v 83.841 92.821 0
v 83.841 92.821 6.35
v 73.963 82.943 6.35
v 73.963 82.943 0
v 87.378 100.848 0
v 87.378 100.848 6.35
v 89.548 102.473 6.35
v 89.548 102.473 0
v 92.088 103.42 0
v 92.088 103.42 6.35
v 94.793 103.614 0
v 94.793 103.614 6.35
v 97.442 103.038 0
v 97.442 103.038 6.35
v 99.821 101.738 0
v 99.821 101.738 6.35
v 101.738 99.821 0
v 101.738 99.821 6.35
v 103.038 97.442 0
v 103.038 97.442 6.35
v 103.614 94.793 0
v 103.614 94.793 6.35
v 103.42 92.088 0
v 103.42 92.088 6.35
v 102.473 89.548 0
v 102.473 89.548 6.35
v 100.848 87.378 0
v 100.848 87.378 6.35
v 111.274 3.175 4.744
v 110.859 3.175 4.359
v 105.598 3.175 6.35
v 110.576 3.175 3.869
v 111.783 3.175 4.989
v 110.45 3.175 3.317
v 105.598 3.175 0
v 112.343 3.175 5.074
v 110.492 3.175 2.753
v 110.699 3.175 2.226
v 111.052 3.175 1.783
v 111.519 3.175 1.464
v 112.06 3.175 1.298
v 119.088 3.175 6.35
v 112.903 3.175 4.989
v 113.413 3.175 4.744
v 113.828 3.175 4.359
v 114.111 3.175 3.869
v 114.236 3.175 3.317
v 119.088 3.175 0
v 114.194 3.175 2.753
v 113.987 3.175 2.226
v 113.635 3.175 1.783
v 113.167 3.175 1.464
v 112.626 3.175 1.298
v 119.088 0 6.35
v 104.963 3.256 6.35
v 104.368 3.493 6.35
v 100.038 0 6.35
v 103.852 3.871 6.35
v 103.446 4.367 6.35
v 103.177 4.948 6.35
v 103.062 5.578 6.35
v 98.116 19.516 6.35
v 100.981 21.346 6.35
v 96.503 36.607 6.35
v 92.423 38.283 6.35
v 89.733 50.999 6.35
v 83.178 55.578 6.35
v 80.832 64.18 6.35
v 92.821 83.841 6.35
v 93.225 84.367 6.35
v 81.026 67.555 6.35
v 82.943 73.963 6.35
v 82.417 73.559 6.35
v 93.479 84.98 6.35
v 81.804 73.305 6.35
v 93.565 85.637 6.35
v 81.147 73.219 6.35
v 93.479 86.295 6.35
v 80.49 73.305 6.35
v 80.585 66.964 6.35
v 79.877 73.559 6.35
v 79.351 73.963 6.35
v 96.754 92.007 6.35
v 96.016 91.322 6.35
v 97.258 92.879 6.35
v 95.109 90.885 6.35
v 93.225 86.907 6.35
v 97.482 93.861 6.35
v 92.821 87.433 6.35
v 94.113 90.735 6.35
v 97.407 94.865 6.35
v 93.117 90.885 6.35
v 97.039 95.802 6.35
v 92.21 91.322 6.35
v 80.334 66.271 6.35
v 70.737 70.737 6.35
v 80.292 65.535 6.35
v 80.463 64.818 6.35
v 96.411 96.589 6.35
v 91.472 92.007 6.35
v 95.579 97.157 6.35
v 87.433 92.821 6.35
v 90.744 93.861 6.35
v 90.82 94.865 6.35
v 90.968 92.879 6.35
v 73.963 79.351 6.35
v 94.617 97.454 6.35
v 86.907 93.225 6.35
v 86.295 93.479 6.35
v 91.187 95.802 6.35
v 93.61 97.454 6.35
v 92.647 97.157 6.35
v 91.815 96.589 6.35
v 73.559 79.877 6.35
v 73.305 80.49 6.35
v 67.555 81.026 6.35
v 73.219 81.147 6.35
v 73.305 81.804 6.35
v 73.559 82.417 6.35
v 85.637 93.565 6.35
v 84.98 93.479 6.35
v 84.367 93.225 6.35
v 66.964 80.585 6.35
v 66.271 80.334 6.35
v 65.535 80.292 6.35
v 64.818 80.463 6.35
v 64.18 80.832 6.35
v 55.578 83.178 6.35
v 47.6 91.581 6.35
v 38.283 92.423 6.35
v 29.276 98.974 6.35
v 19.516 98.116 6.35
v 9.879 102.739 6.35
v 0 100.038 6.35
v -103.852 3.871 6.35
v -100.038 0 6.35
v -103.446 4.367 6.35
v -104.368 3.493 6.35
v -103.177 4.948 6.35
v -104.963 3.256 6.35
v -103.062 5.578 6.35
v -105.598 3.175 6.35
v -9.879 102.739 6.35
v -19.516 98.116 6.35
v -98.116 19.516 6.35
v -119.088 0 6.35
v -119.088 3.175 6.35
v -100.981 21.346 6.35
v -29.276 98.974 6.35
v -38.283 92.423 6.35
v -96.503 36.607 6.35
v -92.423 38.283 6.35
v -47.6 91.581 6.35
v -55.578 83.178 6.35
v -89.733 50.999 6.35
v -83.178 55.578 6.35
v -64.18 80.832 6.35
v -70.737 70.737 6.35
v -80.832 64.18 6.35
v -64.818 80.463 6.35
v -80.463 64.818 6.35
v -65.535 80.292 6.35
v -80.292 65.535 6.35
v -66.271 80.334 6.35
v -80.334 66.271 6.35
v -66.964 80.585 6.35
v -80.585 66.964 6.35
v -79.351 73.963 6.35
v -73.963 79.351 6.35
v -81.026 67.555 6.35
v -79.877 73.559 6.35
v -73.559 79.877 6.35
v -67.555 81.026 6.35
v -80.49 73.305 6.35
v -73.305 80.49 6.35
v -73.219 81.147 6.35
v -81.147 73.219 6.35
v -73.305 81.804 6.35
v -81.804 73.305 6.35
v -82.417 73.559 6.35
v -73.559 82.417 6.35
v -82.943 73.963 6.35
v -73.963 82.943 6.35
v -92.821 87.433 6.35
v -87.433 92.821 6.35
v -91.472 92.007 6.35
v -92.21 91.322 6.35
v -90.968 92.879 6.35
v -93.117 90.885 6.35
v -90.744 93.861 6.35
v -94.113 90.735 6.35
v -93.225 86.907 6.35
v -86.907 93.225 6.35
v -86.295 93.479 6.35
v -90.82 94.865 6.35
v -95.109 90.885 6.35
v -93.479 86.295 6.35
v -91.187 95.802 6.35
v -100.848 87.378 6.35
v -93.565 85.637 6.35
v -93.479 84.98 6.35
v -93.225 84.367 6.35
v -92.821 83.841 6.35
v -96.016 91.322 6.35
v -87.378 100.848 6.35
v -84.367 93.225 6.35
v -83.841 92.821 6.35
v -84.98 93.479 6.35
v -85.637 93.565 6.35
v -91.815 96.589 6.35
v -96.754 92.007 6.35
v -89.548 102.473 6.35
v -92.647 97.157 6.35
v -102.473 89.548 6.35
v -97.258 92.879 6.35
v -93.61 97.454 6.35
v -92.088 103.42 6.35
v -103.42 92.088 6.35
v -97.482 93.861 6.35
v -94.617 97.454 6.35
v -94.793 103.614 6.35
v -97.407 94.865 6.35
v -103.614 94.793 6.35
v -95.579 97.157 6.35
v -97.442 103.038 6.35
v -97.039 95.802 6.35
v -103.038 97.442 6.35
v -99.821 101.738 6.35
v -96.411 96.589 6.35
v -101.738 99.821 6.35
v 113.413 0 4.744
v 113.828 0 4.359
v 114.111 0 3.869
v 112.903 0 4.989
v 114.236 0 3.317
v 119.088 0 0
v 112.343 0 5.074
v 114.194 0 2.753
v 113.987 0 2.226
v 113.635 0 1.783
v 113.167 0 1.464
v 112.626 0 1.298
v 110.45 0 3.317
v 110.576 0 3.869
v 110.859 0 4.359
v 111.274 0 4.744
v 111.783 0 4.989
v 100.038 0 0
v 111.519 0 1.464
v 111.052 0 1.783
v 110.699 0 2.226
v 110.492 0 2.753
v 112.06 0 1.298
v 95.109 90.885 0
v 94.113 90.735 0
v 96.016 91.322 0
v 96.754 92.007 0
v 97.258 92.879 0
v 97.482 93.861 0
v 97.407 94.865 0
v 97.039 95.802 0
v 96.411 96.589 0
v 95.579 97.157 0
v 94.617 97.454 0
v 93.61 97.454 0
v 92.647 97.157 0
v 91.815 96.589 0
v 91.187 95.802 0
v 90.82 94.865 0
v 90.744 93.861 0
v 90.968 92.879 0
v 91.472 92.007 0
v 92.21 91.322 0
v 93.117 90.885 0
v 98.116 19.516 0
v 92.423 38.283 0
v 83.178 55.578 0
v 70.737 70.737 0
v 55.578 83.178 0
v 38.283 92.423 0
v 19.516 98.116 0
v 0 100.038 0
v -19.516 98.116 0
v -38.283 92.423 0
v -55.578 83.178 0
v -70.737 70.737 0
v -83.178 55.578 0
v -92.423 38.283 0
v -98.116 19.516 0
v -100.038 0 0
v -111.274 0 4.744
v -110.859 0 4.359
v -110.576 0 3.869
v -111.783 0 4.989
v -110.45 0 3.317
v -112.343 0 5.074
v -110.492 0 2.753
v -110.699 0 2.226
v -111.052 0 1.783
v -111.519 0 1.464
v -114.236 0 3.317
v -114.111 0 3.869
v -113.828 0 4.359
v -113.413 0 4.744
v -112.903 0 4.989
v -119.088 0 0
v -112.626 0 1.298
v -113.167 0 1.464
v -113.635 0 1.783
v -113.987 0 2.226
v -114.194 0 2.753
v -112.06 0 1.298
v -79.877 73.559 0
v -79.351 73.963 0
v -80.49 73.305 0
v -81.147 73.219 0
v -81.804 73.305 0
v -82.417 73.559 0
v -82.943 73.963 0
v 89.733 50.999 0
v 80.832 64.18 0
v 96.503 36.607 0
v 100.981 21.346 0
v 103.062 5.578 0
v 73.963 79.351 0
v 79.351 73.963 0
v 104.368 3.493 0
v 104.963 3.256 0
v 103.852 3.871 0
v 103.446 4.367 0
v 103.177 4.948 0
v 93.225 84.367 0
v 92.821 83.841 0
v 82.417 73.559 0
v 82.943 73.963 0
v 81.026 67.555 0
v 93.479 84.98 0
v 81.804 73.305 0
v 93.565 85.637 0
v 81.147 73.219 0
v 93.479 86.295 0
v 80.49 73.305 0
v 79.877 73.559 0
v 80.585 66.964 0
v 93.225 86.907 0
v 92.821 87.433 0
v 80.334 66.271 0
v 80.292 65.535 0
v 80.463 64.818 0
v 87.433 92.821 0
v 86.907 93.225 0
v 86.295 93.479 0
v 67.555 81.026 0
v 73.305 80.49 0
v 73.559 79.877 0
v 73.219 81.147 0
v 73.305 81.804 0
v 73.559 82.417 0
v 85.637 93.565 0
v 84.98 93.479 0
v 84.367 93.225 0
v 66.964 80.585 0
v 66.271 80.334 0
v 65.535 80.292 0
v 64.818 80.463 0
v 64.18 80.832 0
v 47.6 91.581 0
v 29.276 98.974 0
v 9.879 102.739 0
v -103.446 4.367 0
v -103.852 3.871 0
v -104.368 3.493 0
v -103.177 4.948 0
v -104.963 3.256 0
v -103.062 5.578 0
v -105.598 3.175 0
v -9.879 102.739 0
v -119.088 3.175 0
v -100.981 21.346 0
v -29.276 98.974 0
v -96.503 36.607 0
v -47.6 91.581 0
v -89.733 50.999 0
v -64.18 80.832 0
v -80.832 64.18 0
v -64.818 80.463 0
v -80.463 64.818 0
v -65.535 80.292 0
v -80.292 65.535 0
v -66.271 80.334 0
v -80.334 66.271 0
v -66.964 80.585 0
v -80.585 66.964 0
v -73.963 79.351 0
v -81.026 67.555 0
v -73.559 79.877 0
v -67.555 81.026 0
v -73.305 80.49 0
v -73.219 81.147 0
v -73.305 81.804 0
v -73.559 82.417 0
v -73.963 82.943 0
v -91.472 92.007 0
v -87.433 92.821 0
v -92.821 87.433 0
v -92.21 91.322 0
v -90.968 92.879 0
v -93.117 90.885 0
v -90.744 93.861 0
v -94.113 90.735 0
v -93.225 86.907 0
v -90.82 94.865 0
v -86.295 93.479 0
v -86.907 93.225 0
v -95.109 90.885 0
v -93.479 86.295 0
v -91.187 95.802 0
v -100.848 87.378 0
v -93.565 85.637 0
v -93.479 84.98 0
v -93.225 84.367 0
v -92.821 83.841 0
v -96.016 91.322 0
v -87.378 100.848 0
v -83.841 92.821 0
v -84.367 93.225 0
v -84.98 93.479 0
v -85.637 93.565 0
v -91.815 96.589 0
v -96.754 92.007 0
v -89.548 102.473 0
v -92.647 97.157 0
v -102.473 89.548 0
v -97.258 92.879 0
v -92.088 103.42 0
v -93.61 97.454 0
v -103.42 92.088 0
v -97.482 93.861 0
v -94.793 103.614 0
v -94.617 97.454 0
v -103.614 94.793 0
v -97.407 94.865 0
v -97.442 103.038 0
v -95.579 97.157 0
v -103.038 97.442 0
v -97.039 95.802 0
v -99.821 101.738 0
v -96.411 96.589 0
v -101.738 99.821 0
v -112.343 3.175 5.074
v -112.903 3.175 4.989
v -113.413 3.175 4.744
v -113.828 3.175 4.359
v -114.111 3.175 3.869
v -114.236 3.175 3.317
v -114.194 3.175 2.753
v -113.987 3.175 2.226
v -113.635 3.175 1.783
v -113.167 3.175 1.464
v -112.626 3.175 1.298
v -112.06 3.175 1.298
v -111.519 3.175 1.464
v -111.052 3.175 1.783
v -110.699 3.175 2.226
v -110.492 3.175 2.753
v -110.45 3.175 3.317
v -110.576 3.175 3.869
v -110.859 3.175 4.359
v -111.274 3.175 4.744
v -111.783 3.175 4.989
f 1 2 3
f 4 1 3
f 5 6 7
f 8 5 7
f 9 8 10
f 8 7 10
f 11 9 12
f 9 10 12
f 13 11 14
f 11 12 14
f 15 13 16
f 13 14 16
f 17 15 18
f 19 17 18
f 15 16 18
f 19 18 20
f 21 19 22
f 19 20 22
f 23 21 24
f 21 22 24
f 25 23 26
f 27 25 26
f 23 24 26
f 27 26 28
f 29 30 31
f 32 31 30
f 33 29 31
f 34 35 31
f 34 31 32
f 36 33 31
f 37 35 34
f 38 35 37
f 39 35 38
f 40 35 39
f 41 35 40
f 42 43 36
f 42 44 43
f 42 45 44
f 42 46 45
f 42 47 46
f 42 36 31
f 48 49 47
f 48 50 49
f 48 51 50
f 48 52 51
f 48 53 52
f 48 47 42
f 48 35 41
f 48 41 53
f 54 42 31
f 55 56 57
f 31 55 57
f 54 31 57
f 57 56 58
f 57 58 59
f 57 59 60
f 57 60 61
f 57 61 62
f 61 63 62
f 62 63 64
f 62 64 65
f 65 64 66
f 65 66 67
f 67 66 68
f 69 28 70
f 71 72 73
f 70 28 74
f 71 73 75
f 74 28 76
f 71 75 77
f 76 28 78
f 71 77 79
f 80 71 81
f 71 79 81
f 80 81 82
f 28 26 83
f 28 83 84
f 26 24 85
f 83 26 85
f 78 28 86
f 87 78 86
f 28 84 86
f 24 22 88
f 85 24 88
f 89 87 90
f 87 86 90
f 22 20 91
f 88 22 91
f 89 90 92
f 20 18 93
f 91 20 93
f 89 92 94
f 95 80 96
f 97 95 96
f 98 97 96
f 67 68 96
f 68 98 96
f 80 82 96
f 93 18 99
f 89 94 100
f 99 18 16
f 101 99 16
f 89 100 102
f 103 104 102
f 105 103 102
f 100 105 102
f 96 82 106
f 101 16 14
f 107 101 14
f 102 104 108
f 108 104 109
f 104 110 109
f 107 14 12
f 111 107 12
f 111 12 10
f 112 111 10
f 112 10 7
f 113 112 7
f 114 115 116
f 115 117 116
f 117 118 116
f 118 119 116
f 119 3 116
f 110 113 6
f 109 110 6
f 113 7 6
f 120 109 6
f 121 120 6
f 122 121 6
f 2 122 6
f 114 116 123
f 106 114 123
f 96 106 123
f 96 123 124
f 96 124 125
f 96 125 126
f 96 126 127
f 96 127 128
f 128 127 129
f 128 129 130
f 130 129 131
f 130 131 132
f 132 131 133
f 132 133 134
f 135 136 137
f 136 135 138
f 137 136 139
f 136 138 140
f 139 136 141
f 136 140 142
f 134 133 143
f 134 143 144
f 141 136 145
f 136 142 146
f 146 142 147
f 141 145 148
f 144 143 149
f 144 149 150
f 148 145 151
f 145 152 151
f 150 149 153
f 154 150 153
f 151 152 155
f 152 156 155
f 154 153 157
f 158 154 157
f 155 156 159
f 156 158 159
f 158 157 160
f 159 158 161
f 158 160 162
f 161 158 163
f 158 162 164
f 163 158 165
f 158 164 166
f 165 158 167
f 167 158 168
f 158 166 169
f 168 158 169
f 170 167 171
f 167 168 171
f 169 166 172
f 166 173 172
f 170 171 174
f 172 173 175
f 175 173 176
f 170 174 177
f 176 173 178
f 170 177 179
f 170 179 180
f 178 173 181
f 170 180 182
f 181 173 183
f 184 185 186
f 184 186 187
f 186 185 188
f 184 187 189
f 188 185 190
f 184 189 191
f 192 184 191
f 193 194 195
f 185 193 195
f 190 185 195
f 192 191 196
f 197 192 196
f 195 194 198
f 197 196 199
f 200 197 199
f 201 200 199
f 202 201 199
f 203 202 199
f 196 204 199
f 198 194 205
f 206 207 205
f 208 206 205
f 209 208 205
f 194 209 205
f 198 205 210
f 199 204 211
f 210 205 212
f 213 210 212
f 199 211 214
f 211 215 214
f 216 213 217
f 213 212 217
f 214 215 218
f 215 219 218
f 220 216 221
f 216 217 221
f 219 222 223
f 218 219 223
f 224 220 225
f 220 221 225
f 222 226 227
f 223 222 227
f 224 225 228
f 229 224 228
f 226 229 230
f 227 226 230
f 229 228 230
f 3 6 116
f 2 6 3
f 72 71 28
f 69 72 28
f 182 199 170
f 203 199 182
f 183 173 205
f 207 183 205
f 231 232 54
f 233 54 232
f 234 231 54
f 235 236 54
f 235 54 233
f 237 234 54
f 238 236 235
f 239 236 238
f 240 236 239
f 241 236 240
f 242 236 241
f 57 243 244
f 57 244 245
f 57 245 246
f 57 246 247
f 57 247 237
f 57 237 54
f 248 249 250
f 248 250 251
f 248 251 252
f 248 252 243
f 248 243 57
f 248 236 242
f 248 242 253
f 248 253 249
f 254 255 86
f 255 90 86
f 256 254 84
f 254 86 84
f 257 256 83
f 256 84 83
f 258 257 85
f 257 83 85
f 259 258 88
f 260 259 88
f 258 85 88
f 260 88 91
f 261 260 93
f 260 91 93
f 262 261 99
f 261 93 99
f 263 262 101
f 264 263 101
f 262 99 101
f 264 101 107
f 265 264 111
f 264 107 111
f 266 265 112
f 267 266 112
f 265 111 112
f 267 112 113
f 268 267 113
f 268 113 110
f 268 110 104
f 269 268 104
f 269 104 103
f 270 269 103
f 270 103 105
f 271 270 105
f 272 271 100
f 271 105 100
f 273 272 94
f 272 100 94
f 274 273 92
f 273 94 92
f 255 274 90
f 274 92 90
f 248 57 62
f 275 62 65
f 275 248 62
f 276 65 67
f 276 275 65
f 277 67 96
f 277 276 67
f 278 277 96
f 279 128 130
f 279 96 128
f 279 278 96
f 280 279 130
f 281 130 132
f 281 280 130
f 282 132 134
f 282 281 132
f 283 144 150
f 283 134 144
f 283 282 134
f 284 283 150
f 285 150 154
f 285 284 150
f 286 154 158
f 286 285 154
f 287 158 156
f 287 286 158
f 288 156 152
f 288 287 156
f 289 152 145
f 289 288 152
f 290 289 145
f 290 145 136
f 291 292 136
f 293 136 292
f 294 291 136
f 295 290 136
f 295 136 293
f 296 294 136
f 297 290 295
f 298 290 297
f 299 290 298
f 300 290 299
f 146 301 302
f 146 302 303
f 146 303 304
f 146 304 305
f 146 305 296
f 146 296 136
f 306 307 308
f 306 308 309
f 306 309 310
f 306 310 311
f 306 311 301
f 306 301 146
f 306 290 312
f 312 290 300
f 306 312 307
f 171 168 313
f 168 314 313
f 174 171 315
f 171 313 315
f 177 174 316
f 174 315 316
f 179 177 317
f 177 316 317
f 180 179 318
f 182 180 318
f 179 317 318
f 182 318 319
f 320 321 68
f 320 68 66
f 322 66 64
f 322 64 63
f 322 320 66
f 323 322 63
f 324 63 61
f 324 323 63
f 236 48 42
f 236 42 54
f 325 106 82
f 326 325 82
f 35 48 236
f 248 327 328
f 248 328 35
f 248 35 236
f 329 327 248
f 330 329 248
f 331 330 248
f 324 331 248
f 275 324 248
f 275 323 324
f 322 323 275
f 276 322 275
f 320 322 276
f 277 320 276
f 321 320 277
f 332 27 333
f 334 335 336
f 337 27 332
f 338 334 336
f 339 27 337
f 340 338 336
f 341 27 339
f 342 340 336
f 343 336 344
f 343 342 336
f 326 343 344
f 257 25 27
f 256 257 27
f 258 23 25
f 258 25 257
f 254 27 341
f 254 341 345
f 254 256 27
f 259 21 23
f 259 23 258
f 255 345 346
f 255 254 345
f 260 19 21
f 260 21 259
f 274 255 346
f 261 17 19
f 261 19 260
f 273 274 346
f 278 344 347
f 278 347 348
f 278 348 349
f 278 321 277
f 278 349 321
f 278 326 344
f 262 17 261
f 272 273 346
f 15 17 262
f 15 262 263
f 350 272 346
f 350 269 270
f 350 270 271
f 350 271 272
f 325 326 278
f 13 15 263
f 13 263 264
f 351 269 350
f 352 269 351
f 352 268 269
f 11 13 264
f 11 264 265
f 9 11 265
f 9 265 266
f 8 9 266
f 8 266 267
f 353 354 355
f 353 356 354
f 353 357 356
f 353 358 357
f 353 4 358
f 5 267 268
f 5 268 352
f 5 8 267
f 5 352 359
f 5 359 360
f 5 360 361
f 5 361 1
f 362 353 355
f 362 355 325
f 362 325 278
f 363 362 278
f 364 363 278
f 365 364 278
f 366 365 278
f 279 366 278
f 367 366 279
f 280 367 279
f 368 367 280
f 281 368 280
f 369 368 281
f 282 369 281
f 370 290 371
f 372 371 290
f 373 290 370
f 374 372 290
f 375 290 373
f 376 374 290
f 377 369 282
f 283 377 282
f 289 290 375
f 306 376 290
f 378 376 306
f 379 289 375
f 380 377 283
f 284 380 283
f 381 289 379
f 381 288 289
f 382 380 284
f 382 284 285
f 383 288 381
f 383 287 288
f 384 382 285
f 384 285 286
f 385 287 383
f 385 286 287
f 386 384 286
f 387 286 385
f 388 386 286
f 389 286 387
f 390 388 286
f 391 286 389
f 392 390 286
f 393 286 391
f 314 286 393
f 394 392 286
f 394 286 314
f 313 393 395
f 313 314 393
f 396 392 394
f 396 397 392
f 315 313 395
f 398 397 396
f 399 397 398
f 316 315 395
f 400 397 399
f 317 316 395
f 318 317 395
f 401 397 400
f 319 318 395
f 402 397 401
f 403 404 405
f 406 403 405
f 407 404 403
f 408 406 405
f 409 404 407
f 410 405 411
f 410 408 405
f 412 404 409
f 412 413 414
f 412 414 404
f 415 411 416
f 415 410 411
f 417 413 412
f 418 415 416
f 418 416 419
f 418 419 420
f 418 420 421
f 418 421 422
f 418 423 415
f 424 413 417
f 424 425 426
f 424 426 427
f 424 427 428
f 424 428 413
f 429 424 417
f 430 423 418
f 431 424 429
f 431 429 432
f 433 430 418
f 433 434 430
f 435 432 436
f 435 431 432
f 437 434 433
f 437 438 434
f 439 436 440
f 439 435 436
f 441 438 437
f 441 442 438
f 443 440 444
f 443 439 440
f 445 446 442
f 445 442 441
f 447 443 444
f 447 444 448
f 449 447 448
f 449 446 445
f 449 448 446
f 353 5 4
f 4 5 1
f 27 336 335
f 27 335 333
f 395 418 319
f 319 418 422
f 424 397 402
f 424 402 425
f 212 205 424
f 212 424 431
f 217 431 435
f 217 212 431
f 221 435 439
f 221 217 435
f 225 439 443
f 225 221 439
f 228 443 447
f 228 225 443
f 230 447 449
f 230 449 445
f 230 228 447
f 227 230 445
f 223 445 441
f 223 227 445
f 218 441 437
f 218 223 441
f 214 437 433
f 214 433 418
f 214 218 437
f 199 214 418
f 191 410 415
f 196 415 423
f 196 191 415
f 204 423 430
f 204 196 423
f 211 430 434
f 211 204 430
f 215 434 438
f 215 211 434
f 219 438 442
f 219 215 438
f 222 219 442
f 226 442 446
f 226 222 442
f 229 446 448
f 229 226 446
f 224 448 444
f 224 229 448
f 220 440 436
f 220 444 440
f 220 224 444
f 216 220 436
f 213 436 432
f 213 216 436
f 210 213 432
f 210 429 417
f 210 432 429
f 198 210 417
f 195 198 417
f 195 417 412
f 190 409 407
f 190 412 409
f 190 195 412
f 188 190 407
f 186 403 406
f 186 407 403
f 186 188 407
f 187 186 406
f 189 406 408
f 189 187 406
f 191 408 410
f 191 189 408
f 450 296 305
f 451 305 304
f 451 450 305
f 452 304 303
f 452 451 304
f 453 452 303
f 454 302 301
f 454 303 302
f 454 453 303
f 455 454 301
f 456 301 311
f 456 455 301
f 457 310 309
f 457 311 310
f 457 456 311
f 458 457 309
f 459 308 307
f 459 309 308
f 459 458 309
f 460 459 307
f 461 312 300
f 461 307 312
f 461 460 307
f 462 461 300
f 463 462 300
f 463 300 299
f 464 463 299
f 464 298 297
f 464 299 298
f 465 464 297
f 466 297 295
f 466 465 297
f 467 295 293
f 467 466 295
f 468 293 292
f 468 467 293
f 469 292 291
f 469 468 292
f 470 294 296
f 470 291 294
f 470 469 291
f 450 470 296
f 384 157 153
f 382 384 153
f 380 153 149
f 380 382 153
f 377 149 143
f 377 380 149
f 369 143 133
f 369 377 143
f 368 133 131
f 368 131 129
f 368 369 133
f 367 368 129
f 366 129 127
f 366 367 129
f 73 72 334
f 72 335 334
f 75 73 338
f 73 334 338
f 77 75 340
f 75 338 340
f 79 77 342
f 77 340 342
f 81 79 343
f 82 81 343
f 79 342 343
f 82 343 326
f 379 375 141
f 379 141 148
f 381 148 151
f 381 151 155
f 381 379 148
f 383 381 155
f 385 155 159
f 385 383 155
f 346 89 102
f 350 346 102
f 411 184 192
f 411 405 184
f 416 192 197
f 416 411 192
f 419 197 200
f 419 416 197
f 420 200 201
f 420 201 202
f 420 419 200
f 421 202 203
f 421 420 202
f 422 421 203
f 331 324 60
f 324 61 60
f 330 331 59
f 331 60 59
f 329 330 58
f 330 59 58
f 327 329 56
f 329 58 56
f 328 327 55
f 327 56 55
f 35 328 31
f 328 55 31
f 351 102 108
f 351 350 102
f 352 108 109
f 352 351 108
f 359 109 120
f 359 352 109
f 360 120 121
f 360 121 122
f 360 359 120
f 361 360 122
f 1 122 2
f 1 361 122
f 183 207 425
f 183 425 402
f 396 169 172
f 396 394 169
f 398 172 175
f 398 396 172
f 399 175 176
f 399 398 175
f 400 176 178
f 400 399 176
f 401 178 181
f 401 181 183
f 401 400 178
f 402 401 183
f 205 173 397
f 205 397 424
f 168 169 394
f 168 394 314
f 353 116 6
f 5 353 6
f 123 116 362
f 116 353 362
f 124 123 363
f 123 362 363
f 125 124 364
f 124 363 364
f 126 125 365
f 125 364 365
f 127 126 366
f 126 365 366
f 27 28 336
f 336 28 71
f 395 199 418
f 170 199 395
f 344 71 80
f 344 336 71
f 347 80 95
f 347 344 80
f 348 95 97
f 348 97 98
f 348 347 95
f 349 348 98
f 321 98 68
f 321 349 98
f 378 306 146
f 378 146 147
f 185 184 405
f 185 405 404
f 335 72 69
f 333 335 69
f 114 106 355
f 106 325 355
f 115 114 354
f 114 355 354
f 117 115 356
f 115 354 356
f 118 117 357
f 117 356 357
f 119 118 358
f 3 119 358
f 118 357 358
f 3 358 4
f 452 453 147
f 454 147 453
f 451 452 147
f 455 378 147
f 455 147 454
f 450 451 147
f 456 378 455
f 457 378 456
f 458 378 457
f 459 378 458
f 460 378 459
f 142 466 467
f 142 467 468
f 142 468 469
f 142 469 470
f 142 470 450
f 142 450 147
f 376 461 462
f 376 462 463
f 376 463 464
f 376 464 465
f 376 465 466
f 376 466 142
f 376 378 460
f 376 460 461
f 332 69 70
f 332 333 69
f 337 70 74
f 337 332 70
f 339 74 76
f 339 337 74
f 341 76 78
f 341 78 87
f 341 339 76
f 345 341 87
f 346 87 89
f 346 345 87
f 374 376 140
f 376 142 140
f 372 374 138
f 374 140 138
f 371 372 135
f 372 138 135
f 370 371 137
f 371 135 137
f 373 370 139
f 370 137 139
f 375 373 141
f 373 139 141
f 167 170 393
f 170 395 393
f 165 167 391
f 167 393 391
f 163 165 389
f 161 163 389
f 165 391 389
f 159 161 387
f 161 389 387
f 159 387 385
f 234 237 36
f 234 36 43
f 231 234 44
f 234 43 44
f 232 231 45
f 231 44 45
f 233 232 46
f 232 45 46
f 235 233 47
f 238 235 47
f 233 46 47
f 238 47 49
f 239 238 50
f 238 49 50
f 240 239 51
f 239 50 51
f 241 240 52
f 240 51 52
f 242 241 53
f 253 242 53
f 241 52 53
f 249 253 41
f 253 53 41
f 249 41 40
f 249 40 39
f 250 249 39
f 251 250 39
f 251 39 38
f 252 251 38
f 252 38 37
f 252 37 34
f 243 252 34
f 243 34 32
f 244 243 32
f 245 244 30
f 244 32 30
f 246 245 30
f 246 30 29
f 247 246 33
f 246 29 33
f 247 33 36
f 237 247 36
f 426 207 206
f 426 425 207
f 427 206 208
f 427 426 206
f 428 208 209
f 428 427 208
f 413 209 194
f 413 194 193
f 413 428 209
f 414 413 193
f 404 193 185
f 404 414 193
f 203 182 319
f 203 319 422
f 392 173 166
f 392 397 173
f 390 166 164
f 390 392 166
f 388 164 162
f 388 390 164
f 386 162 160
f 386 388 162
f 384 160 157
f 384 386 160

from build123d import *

# Parameters (mm, degrees)
BOSS_EXTRUDE1_DEPTH  = 6.35
FILLET1_R            = 2.54
BOSS_EXTRUDE2_DEPTH  = 6.35
FILLET2_R            = 2.54
FILLET2_OF_MIRROR1_R = 2.54


with BuildPart() as part:
    # Sketch1 → Boss-Extrude1 (new body)
    with BuildSketch(Plane.XY):
        with BuildLine():
            Line((-100.0379, 0), (-119.0879, 0))
            Line((-119.0879, 0), (-119.0879, 3.175))
            Line((-119.0879, 3.175), (-103.164054309, 3.175))
            ThreePointArc((-103.164054309, 3.175), (0, 103.2129), (103.164054309, 3.175))
            Line((103.164054309, 3.175), (119.0879, 3.175))
            Line((119.0879, 3.175), (119.0879, 0))
            Line((119.0879, 0), (100.0379, 0))
            ThreePointArc((100.0379, 0), (0, 100.0379), (-100.0379, 0))
        make_face()
    extrude(amount=BOSS_EXTRUDE1_DEPTH)

    # Fillet1
    fillet1_edges = [part.edges().sort_by_distance(p)[0] for p in [
        (-103.164054309, 3.175, 3.175),
        (103.164054309, 3.175, 3.175),
    ]]
    fillet(fillet1_edges, radius=FILLET1_R)

    # Sketch2 → Boss-Extrude2 (add)
    with BuildSketch(Plane.XY.offset(6.35)):
        with BuildLine():
            Line((-100.84827624, 87.377892058), (-79.406290546, 65.935906365))
            Line((-79.406290546, 65.935906365), (-70.737477466, 70.737477466))
            Line((-70.737477466, 70.737477466), (-65.935906365, 79.406290546))
            Line((-65.935906365, 79.406290546), (-87.377892058, 100.84827624))
            ThreePointArc((-87.377892058, 100.84827624), (-100.84827624, 100.84827624), (-100.84827624, 87.377892058))
        make_face()
        Polygon((-94.617411453, 85.637155332), (-85.637155332, 94.617411453), (-72.166771151, 81.147027272), (-81.147027272, 72.166771151), align=None, mode=Mode.SUBTRACT)
    boss_extrude2 = extrude(amount=-BOSS_EXTRUDE2_DEPTH)

    # Fillet2
    fillet2_edges = [part.edges().sort_by_distance(p)[0] for p in [
        (-65.935906365, 79.406290546, 3.175),
        (-79.406290546, 65.935906365, 3.175),
        (-94.617411453, 85.637155332, 3.175),
        (-85.637155332, 94.617411453, 3.175),
        (-72.166771151, 81.147027272, 3.175),
        (-81.147027272, 72.166771151, 3.175),
    ]]
    fillet(fillet2_edges, radius=FILLET2_R)

    # Sketch3 → 1/4 Clearance Hole1 (revolve, cut)
    with BuildSketch(Plane(origin=(-94.113084149, 94.113084149, 6.35), x_dir=(0, -1, 0), z_dir=(1, 0, 0))):
        Polygon((0, 0), (0, 27.429827343), (3.3782, 25.4), (3.3782, 0), align=None)
    f_1_4_clearance_hole1 = revolve(axis=Axis((-94.113084149, 94.113084149, 12.7), (0, 0, -1)), mode=Mode.SUBTRACT)

    # Sketch5 → #6 Clearance Hole1 (revolve, cut)
    with BuildSketch(Plane(origin=(-112.343132364, 3.175, 3.175), x_dir=(0, 0, 1), z_dir=(1, 0, 0))):
        Polygon((0, 0), (0, 26.540824014), (1.89865, 25.4), (1.89865, 0), align=None)
    f_6_clearance_hole1 = revolve(axis=Axis((-112.343132364, 9.525, 3.175), (0, -1, 0)), mode=Mode.SUBTRACT)

    # Mirror1: Boss-Extrude2, 1/4 Clearance Hole1, #6 Clearance Hole1 across plane
    add(boss_extrude2.mirror(Plane(origin=(0, 0, 0), x_dir=(0, 0, 1), z_dir=(1, 0, 0))))
    add(f_1_4_clearance_hole1.mirror(Plane(origin=(0, 0, 0), x_dir=(0, 0, 1), z_dir=(1, 0, 0))), mode=Mode.SUBTRACT)
    add(f_6_clearance_hole1.mirror(Plane(origin=(0, 0, 0), x_dir=(0, 0, 1), z_dir=(1, 0, 0))), mode=Mode.SUBTRACT)

    # Fillet2 of Mirror1
    fillet2_of_mirror1_edges = [part.edges().sort_by_distance(p)[0] for p in [
        (65.935906365, 79.406290546, 3.175),
        (79.406290546, 65.935906365, 3.175),
        (94.617411453, 85.637155332, 3.175),
        (85.637155332, 94.617411453, 3.175),
        (72.166771151, 81.147027272, 3.175),
        (81.147027272, 72.166771151, 3.175),
    ]]
    fillet(fillet2_of_mirror1_edges, radius=FILLET2_OF_MIRROR1_R)


solid = part.part
